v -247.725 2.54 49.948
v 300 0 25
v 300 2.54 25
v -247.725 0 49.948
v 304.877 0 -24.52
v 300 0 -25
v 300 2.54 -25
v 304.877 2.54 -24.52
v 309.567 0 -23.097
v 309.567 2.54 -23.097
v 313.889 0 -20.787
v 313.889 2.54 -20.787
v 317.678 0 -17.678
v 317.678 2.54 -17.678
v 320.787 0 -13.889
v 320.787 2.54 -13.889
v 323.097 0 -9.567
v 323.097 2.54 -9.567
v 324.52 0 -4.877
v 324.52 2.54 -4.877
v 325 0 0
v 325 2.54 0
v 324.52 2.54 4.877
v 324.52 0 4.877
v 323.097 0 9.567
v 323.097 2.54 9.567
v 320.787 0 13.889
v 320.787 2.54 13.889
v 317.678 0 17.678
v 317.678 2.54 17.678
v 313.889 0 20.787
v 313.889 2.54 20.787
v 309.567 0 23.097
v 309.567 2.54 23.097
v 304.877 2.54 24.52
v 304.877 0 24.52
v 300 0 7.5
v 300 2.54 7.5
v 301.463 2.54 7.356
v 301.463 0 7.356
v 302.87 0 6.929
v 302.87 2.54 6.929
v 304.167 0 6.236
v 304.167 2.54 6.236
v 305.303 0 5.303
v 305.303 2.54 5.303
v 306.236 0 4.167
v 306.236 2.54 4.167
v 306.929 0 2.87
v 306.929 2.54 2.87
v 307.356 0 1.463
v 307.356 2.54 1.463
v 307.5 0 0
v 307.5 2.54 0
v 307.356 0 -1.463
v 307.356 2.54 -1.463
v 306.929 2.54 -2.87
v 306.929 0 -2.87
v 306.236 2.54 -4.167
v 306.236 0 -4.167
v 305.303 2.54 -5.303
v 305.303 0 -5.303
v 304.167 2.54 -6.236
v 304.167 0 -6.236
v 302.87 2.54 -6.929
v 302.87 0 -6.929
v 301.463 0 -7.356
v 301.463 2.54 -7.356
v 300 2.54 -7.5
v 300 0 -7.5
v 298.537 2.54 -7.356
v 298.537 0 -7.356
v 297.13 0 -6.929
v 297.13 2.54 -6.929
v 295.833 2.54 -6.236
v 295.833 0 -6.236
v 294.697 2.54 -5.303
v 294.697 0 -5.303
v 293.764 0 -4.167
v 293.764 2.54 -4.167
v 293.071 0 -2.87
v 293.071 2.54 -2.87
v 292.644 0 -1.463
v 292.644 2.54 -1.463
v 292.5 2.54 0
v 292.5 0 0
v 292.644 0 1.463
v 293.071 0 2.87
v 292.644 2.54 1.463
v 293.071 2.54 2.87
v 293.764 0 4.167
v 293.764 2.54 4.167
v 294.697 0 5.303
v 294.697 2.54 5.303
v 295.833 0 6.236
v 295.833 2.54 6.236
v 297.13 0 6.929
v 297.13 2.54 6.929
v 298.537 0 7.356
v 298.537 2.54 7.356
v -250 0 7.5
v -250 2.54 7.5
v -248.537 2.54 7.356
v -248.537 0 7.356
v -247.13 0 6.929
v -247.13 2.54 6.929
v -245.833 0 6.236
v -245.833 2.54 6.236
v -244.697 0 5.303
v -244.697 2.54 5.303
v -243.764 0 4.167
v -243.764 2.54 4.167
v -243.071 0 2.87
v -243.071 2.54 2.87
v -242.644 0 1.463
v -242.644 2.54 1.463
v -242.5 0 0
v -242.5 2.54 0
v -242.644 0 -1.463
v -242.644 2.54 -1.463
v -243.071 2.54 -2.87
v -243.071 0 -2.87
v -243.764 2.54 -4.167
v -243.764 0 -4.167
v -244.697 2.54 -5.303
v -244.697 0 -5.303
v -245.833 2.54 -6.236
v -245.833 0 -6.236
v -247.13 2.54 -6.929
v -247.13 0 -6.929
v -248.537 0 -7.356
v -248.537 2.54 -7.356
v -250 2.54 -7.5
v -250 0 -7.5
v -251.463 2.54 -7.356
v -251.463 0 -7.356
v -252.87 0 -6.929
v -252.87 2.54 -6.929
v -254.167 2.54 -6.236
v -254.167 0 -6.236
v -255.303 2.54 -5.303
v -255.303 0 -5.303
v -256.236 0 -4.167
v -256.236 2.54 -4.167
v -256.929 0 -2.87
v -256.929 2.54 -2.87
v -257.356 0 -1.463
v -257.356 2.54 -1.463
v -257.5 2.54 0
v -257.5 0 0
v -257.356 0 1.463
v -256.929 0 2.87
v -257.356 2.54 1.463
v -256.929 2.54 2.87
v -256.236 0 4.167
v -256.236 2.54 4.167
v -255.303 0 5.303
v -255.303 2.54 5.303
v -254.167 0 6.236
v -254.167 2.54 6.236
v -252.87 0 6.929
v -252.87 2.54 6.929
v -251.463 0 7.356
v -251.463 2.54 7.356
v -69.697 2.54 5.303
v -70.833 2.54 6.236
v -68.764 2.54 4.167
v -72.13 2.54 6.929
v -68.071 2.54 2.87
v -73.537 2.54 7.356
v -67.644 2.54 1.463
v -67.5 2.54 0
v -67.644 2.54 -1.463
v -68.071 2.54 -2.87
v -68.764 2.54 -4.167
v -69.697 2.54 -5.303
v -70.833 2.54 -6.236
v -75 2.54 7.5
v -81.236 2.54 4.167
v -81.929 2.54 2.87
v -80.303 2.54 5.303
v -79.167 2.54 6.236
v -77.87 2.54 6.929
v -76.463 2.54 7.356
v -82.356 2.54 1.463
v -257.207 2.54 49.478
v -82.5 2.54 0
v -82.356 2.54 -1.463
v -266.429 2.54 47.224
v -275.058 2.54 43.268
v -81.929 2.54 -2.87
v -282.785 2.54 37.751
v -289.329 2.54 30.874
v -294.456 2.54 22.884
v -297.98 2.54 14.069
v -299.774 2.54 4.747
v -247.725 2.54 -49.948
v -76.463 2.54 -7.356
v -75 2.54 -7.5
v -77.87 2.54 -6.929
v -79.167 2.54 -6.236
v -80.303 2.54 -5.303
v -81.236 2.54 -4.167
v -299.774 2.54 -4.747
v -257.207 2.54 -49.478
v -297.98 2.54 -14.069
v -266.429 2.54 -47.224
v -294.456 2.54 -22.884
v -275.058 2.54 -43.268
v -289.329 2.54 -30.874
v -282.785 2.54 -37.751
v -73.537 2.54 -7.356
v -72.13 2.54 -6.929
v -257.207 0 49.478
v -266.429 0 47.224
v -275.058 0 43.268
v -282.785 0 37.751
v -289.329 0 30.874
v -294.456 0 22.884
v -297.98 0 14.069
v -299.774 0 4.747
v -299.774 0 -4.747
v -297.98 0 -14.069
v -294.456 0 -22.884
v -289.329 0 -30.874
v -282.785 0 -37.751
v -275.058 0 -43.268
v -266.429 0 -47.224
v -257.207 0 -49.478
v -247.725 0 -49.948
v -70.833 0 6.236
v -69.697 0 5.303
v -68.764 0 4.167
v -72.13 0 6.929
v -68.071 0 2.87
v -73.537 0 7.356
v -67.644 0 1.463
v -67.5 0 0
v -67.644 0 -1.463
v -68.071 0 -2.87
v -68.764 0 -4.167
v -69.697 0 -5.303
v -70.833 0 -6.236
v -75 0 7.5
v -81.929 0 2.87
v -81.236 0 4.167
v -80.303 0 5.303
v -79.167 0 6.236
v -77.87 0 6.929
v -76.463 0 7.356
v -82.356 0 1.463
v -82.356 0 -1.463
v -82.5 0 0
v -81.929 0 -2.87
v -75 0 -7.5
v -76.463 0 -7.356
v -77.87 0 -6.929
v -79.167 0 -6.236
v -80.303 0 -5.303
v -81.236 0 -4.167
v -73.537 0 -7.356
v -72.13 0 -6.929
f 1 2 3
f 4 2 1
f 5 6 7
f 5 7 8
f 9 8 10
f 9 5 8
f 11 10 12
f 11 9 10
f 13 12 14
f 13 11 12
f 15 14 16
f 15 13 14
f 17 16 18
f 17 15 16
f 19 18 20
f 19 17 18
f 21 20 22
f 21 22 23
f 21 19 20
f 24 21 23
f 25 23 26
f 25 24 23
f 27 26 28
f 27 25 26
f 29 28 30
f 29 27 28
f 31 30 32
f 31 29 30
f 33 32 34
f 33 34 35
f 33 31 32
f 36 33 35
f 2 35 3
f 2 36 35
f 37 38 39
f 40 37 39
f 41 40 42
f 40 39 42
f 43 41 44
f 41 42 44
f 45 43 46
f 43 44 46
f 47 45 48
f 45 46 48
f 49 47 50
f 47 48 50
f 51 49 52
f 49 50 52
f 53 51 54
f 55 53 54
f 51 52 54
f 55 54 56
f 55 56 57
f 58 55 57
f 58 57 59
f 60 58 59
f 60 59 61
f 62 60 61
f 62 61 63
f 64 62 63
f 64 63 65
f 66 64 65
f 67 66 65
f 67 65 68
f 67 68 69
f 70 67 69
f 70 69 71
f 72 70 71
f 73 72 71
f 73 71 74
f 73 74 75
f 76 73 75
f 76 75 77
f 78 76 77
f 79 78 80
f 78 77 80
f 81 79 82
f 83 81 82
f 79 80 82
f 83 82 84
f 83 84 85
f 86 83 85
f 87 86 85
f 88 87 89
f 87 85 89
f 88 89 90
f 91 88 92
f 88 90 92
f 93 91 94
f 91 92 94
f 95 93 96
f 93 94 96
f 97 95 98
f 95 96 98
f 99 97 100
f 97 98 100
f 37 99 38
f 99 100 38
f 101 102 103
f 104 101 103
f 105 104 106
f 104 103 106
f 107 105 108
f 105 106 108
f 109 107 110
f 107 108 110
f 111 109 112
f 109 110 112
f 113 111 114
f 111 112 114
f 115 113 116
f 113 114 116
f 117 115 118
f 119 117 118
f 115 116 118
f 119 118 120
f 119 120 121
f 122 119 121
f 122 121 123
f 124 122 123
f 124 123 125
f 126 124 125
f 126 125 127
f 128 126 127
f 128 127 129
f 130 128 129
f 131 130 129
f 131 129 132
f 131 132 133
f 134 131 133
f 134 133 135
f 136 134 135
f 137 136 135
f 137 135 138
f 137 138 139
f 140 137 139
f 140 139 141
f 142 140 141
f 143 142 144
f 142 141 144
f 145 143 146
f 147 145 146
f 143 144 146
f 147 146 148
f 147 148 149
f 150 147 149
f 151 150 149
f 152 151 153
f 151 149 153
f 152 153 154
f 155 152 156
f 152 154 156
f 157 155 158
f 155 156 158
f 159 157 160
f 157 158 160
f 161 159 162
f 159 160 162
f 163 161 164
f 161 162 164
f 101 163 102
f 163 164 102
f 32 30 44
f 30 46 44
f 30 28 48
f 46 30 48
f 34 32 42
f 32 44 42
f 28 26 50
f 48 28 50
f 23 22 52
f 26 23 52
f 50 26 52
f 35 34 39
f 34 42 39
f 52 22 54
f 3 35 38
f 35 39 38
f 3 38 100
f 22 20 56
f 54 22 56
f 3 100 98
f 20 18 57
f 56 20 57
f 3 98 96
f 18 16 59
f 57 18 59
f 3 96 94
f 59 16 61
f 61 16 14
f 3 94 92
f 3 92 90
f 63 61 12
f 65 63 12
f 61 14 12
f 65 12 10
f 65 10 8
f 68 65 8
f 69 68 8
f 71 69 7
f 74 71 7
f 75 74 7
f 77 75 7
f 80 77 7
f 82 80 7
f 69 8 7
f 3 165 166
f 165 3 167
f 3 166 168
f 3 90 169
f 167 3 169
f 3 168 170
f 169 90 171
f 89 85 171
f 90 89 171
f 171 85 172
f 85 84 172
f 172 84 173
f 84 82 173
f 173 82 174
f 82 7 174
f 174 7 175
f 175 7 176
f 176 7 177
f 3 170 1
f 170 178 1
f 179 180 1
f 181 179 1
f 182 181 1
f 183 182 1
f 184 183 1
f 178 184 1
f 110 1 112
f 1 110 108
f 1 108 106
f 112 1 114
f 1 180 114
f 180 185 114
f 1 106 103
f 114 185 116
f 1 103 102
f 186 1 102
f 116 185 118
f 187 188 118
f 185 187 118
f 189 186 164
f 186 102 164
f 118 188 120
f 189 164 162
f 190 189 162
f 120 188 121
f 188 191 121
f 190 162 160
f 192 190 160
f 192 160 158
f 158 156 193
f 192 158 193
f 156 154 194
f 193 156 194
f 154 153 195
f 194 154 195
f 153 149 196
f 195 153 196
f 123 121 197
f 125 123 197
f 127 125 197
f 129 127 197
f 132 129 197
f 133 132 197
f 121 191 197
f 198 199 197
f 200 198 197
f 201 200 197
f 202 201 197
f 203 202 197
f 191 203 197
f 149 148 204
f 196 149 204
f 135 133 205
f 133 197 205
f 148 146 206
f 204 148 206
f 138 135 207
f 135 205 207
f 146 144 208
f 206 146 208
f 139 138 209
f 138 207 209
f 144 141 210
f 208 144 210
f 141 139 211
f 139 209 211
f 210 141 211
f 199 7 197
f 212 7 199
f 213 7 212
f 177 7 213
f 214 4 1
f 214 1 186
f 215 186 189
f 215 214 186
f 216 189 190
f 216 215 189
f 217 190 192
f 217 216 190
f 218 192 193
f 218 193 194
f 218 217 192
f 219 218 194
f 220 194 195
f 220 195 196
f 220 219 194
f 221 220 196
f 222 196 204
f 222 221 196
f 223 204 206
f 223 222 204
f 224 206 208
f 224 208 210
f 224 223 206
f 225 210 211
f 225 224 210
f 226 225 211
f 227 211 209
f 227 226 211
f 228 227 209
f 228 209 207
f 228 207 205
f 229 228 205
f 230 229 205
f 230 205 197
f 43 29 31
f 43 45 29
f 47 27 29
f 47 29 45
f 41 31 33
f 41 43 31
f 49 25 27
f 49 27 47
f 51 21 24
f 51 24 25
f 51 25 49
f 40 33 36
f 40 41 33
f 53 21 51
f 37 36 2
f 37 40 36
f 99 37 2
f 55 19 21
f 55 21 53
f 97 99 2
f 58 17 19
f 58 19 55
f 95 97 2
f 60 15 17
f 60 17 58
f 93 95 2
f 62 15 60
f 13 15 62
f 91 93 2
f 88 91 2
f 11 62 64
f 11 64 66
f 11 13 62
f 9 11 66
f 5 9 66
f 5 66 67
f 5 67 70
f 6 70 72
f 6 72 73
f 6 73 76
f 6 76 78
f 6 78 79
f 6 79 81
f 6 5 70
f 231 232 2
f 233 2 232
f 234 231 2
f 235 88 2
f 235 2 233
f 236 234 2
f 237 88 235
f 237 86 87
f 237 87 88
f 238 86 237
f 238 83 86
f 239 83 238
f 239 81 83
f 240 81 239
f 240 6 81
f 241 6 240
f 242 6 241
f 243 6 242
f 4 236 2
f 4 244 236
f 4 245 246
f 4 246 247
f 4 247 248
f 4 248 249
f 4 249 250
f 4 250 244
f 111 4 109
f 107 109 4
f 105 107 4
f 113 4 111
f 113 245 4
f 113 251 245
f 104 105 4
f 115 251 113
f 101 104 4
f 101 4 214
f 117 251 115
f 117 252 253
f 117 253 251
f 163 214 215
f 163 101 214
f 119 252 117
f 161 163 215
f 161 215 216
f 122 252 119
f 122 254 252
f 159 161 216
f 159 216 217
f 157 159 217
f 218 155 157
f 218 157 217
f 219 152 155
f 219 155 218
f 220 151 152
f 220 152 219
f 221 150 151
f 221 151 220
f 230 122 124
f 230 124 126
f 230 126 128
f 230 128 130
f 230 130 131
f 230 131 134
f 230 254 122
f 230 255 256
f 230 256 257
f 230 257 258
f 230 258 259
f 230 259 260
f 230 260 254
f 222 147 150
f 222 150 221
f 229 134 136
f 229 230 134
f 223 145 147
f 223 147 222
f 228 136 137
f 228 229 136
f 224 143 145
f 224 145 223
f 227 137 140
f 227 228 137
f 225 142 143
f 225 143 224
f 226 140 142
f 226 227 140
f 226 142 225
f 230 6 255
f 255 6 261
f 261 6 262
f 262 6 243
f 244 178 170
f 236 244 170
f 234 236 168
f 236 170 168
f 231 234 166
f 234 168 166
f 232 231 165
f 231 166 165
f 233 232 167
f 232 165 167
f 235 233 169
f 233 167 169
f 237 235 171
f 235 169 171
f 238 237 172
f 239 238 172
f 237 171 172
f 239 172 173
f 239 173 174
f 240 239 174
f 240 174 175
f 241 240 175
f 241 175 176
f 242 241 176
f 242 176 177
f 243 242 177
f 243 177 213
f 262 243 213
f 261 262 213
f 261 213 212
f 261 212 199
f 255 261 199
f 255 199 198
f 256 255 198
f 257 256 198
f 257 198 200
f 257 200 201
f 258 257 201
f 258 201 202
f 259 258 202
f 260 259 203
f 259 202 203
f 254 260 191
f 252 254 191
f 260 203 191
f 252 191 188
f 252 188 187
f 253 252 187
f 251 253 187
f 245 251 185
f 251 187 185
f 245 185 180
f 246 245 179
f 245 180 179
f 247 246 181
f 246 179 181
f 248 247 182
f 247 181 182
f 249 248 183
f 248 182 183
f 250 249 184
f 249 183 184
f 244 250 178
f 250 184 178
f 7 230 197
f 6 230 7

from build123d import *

# Parameters (mm, degrees)
BOSS_EXTRUDE1_DEPTH = 2.54
SKETCH2_R           = 7.5
CUT_EXTRUDE1_DEPTH  = 10


with BuildPart() as part:
    # Sketch1 → Boss-Extrude1 (new body)
    with BuildSketch(Plane(origin=(0, 0, 0), x_dir=(1, 0, 0), z_dir=(0, 1, 0))):
        with BuildLine():
            Line((-247.724918783, 49.948213236), (300, 25))
            ThreePointArc((300, 25), (325, 0), (300, -25))
            Line((300, -25), (-247.724918783, -49.948213236))
            ThreePointArc((-247.724918783, -49.948213236), (-300, 0), (-247.724918783, 49.948213236))
        make_face()
    extrude(amount=BOSS_EXTRUDE1_DEPTH)

    # Sketch2 → Cut-Extrude1 (cut)
    with BuildSketch(Plane(origin=(0, 2.54, 0), x_dir=(1, 0, 0), z_dir=(0, 1, 0))):
        with Locations(Location((-75, 0, 0), (0, 0, 270))):
            Circle(SKETCH2_R)
        with Locations(Location((300, 0, 0), (0, 0, 270))):
            Circle(SKETCH2_R)
        with Locations(Location((-250, 0, 0), (0, 0, 270))):
            Circle(SKETCH2_R)
    extrude(amount=-CUT_EXTRUDE1_DEPTH, mode=Mode.SUBTRACT)


solid = part.part
